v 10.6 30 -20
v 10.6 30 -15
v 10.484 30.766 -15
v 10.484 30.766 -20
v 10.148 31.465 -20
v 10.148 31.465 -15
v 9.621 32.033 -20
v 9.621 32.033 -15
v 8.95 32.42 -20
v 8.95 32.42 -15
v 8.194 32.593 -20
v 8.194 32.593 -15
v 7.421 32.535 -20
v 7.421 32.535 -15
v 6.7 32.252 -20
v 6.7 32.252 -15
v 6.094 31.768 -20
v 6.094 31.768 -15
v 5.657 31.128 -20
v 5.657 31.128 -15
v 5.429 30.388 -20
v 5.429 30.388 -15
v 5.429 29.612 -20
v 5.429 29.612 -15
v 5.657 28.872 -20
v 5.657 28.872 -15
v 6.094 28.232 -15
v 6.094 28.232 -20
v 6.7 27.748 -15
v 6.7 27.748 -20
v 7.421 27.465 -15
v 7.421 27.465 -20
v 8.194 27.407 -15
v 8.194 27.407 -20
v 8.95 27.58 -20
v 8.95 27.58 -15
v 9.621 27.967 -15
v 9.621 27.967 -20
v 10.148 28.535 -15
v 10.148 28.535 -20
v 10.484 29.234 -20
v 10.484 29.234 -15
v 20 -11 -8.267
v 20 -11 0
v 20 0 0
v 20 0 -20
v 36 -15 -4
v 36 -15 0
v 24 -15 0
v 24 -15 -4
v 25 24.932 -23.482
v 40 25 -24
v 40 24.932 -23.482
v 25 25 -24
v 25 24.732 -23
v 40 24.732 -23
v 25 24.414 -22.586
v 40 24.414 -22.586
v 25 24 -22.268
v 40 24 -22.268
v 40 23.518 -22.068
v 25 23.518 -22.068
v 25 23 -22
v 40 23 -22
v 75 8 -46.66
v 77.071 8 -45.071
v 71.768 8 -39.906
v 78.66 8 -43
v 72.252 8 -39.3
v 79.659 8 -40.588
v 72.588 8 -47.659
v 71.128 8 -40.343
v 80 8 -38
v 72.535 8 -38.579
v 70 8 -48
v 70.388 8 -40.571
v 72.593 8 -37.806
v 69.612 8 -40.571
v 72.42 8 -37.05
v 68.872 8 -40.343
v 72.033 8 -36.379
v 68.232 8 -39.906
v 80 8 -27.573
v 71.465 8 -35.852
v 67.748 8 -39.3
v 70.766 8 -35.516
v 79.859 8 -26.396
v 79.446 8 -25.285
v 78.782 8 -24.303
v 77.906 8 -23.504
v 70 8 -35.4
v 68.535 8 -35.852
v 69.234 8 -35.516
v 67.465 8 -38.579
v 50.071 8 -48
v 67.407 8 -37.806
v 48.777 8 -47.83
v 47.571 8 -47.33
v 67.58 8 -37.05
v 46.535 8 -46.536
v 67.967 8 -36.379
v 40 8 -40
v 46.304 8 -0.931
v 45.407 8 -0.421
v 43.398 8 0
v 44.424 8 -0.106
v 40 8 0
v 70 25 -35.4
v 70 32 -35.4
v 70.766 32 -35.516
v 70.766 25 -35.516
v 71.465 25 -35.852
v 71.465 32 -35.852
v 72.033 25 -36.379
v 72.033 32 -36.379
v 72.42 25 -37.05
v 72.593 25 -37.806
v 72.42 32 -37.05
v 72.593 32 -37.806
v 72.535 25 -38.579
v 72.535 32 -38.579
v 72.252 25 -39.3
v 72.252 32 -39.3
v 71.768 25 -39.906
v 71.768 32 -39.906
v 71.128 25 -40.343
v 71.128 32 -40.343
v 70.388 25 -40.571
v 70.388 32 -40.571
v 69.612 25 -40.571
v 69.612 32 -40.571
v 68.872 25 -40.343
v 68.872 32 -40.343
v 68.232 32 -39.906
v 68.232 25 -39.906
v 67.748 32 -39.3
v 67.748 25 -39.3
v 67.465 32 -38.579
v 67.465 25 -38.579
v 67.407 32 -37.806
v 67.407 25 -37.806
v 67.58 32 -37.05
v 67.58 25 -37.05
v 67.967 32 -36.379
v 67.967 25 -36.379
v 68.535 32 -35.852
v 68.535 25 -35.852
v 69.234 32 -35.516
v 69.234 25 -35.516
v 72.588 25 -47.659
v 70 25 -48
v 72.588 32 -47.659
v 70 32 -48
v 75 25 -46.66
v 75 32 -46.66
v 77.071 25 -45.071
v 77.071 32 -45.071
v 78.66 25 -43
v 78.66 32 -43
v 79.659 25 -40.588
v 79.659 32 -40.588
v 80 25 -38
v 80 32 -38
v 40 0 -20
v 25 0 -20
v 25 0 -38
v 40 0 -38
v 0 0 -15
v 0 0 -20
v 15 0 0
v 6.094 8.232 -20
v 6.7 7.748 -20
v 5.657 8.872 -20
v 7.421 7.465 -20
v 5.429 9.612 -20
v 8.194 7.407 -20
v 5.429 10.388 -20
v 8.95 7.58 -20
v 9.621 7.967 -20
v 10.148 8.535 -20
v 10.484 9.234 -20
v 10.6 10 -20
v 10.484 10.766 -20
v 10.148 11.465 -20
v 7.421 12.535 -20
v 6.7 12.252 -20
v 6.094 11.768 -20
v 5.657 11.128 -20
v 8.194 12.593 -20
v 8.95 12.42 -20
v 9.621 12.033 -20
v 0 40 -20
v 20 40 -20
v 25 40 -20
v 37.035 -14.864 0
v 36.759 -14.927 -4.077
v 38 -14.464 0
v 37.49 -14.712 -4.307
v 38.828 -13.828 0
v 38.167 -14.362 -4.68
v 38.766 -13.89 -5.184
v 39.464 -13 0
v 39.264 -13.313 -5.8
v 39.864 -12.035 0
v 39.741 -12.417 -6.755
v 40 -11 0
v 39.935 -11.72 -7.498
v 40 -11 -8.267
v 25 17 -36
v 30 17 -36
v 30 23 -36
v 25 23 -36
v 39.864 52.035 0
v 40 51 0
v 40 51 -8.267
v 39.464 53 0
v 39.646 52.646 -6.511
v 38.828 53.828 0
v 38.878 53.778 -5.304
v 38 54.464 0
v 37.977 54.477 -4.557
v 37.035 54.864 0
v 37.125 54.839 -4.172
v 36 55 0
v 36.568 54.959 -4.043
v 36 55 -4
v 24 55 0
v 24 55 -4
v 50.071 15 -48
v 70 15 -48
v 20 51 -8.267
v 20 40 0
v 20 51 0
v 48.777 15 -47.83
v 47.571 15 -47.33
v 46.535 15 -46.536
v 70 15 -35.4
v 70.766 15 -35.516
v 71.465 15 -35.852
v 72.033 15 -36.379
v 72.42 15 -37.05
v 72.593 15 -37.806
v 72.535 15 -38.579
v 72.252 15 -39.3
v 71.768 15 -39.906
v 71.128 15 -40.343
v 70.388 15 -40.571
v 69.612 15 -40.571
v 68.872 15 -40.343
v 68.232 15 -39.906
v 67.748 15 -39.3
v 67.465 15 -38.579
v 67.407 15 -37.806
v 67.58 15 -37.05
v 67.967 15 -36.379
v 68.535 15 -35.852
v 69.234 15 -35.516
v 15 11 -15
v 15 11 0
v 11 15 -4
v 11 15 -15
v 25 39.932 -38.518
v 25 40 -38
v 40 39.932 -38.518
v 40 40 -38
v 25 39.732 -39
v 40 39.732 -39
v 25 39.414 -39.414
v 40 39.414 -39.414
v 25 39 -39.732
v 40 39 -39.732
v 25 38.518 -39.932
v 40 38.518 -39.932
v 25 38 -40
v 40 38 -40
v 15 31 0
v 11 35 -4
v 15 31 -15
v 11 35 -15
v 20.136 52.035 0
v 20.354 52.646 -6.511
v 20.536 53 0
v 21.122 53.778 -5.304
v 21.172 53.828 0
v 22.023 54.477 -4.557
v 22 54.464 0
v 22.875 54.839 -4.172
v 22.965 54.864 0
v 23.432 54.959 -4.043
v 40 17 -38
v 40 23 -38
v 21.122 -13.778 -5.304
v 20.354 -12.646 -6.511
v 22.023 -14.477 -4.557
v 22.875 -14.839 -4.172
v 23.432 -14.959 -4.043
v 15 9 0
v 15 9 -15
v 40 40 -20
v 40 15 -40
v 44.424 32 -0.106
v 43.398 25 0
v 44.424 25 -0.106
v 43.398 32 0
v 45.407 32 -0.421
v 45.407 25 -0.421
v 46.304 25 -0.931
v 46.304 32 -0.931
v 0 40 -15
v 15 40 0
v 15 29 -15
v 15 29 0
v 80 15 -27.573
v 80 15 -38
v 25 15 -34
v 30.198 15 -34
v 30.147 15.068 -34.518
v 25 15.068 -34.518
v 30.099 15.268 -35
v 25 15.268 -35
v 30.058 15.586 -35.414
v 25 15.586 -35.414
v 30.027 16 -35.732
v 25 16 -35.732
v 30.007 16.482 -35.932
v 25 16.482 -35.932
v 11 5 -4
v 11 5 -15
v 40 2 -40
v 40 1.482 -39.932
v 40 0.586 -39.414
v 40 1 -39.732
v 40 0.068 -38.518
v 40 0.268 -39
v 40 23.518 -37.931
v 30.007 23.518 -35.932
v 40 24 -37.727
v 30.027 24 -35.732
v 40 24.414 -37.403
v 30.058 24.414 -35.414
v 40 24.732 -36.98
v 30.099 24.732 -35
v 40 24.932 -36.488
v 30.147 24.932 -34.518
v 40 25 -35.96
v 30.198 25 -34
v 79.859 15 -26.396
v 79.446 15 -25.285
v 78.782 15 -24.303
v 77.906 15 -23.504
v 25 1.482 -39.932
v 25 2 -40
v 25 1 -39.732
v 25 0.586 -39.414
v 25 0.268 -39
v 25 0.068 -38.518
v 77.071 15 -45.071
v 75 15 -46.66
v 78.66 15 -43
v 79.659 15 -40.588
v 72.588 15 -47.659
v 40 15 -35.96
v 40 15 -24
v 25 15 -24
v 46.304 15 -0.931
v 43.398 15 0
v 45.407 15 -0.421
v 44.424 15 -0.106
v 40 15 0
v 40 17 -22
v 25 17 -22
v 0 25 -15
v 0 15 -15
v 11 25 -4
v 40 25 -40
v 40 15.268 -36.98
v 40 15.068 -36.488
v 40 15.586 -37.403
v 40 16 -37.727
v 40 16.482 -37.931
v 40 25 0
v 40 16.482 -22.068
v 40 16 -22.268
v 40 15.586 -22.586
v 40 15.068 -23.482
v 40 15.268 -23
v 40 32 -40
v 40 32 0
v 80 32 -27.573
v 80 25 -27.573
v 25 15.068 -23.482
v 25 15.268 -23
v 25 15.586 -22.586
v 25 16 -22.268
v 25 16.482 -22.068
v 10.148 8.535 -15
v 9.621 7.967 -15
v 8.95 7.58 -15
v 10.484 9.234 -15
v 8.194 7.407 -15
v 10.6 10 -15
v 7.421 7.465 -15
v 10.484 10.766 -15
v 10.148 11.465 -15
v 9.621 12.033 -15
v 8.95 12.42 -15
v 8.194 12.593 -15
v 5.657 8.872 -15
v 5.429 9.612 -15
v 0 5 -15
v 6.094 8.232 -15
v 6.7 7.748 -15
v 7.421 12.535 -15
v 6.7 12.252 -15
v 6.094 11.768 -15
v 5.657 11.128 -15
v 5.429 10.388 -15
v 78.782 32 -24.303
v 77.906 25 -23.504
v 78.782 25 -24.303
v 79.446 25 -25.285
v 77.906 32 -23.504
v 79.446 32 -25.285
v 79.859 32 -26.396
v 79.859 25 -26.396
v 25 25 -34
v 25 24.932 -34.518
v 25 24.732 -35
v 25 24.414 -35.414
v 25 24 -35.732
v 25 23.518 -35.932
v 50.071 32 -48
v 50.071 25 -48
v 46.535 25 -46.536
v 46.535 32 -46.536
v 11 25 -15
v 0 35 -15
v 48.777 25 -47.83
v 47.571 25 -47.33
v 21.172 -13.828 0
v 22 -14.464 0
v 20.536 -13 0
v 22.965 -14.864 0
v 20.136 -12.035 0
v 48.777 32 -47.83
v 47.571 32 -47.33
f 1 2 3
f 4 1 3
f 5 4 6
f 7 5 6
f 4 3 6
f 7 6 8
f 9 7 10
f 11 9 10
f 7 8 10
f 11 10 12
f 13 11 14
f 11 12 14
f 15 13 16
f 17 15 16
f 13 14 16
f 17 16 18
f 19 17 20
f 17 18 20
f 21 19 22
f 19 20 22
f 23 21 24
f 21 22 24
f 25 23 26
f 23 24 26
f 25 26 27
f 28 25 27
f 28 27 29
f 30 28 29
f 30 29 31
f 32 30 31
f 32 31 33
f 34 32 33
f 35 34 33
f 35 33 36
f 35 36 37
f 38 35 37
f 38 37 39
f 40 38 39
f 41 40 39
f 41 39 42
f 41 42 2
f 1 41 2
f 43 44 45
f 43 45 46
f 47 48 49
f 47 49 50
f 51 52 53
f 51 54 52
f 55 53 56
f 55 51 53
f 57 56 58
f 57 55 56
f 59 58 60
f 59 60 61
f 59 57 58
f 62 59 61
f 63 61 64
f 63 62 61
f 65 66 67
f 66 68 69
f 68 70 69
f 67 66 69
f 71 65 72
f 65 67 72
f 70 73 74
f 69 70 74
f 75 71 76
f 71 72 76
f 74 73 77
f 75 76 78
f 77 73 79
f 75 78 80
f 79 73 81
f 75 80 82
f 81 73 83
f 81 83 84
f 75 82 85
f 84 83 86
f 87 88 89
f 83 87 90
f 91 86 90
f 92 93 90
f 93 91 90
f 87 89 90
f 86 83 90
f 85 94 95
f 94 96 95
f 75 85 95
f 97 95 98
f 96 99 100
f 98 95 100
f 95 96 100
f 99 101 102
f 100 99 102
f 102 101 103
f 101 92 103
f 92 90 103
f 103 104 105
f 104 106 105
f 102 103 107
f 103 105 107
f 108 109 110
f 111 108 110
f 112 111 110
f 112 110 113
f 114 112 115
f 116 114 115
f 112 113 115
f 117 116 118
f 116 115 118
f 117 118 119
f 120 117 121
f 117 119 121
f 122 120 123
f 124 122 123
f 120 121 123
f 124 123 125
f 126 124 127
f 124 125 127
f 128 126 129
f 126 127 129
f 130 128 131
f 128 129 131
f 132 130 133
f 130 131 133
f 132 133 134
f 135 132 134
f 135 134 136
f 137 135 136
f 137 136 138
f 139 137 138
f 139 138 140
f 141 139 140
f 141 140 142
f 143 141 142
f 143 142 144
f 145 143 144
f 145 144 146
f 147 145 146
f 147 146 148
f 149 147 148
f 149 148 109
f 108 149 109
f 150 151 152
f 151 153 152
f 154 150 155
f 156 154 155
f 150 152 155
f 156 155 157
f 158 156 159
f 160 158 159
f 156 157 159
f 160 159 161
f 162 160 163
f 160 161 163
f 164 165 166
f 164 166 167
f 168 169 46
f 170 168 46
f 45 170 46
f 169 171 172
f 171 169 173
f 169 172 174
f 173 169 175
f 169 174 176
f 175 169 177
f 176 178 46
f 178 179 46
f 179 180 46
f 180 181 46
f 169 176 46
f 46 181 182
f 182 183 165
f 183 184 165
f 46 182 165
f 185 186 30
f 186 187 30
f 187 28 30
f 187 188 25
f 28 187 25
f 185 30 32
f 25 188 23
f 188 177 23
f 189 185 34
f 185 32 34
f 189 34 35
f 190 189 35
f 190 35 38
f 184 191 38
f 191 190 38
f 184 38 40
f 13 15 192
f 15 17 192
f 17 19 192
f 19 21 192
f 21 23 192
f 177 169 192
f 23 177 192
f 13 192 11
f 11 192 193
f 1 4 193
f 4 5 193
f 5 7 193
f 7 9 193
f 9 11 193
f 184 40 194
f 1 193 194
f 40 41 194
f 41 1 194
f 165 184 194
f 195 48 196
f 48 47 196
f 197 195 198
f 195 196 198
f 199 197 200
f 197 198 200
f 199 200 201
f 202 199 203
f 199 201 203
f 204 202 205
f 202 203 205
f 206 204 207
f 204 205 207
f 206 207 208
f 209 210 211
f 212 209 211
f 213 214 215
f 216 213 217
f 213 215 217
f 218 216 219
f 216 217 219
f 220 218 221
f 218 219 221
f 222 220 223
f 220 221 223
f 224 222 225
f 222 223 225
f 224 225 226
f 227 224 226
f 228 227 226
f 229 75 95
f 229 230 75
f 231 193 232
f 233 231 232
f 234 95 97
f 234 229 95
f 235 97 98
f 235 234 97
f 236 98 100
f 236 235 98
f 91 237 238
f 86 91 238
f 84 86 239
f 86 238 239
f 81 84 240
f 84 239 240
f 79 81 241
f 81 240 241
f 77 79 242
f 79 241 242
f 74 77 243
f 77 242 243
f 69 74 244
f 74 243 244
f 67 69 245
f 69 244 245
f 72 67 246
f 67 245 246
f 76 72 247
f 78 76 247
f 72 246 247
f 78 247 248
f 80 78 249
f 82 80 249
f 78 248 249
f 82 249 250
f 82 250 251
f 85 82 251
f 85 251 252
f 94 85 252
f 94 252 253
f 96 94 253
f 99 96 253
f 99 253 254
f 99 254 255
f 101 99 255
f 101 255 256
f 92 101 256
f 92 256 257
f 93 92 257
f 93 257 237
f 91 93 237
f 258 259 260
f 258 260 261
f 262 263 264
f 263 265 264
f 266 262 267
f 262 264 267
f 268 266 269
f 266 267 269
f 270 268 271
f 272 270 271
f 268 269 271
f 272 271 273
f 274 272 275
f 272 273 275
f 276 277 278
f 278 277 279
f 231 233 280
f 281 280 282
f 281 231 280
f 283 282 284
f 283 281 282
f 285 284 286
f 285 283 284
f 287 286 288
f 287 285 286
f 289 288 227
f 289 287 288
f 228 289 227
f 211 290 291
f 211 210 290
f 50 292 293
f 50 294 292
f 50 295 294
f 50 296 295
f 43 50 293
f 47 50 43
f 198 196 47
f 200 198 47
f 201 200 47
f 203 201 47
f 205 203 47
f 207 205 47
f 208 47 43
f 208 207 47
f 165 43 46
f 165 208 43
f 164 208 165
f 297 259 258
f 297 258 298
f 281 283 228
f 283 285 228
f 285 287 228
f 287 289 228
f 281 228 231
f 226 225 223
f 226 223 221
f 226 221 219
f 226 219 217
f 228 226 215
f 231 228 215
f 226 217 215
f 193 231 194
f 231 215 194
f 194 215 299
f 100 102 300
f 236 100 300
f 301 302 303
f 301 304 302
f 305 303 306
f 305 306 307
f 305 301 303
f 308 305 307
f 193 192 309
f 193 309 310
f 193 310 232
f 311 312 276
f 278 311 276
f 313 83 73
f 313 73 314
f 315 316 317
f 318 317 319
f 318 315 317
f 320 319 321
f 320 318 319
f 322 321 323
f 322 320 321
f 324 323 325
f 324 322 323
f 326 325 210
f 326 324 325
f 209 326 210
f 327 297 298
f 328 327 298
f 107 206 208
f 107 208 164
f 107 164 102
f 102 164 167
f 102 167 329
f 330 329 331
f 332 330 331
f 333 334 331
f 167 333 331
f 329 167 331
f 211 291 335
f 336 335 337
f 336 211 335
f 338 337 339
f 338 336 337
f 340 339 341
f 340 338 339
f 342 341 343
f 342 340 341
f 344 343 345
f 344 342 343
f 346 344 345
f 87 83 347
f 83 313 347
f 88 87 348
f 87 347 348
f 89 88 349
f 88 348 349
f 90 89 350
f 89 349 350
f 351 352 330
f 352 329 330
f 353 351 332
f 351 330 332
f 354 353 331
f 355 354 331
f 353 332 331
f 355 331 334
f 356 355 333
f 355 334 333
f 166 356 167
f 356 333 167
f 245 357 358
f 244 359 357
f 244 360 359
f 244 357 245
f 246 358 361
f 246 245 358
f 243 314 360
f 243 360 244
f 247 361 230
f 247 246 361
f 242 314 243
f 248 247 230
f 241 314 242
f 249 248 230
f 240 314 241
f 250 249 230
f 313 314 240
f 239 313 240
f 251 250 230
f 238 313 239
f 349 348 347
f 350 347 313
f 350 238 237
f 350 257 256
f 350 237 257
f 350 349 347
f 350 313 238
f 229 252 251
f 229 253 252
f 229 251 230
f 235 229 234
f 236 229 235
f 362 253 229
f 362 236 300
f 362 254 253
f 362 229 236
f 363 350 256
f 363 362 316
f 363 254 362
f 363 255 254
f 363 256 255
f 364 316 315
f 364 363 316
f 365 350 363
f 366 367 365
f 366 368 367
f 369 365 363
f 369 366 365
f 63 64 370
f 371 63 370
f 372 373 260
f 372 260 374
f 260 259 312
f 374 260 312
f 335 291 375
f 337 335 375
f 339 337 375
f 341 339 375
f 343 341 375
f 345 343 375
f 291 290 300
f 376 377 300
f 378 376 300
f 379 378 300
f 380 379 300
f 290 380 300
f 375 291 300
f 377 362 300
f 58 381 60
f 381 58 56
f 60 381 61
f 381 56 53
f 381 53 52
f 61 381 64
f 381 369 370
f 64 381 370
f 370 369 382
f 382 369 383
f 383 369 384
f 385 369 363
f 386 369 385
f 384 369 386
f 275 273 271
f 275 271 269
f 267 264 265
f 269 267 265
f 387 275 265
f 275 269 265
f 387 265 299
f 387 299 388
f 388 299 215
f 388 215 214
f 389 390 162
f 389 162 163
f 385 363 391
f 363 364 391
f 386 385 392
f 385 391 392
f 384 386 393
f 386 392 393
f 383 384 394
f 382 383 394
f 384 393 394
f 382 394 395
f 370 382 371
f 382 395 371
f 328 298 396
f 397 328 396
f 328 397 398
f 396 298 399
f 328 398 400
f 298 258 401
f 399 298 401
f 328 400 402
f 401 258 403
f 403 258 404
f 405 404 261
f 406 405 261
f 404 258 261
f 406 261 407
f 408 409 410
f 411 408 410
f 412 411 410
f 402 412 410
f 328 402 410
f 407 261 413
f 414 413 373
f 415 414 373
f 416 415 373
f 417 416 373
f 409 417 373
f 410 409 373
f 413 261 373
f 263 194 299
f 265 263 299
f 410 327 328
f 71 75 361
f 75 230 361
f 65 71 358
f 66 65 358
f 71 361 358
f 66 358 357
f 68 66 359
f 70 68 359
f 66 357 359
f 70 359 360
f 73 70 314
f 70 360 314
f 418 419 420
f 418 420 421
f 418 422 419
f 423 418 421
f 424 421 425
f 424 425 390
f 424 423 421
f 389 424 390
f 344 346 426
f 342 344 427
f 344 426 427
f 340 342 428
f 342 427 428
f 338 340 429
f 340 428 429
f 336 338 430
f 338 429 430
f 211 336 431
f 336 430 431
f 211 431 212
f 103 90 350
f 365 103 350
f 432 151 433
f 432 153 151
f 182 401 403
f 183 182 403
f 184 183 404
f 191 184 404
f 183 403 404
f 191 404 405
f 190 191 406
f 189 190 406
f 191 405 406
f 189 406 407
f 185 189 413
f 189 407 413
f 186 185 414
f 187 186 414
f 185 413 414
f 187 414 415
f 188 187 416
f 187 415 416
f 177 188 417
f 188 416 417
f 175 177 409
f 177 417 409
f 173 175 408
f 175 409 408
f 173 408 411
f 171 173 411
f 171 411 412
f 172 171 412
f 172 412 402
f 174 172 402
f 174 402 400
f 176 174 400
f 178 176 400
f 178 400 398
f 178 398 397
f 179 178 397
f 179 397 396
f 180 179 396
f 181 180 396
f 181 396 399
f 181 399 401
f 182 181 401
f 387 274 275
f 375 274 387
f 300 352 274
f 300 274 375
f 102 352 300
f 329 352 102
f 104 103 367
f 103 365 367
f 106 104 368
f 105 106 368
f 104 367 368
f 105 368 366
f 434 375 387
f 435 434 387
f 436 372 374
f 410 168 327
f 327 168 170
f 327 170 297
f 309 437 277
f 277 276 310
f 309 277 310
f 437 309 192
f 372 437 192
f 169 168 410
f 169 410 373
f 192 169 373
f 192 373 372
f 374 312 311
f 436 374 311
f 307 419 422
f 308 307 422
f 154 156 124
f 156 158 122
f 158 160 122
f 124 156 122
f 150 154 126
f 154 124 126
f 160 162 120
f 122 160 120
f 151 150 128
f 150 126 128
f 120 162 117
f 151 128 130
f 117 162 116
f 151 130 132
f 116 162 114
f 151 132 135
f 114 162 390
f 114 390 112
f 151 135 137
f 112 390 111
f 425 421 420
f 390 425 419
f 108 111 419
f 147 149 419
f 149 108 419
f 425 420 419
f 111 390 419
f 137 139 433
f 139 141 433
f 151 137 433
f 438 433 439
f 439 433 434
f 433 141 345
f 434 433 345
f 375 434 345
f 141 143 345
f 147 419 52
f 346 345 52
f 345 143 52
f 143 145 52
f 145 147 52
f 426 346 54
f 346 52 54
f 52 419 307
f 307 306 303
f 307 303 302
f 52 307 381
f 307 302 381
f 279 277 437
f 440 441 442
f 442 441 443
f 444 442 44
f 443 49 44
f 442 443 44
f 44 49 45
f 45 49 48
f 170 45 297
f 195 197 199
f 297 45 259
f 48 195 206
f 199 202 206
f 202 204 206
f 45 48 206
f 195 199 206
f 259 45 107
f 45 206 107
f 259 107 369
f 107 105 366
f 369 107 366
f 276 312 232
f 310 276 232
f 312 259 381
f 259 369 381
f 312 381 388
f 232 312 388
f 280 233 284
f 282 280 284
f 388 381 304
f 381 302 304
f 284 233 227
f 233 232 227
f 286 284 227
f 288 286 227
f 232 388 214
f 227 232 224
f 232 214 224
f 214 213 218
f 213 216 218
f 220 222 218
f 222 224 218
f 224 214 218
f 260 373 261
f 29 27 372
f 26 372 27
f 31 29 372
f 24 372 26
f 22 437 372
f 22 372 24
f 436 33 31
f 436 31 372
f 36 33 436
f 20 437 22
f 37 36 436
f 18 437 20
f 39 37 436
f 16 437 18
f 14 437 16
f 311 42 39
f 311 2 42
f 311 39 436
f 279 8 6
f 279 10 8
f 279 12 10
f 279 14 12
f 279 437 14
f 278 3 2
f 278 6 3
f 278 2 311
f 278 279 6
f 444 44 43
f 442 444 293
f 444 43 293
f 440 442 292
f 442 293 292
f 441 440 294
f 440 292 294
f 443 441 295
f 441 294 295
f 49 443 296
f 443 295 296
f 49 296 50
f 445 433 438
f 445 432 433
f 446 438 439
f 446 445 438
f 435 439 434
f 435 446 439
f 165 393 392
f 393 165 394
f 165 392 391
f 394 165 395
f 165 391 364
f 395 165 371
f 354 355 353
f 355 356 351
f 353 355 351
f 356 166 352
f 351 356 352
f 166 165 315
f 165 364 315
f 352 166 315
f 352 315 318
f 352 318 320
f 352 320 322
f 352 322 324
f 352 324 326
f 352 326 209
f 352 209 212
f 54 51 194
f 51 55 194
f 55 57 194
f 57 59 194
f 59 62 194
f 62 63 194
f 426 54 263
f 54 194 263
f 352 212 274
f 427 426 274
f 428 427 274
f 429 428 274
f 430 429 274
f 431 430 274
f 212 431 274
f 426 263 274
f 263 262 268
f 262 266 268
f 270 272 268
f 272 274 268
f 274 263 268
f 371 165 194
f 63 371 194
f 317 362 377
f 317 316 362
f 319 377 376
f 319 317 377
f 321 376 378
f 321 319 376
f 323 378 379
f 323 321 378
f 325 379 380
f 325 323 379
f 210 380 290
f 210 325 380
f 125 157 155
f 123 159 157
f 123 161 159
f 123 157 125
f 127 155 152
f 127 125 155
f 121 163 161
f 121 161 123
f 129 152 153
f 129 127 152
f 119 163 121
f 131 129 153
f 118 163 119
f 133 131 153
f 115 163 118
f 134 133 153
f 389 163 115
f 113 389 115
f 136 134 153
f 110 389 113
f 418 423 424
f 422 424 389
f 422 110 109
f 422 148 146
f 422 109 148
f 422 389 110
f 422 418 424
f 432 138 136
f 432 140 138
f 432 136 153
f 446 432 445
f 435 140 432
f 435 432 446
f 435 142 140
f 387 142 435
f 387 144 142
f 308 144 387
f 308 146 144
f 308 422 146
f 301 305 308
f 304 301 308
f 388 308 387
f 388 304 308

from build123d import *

# Parameters (mm, degrees)
SKETCH1_W                = 40
SKETCH1_H                = 40
BOSS_EXTRUDE1_DEPTH      = 40
SKETCH2_W                = 25
SKETCH2_H                = 20
CUT_EXTRUDE1_DEPTH       = 40
CHAMFER1_SIZE            = 15
CUT_EXTRUDE2_DEPTH       = 15
CHAMFER2_SIZE            = 4
SKETCH4_R                = 2.6
CUT_EXTRUDE3_DEPTH       = 17
BOSS_EXTRUDE2_DEPTH      = 8
BOSS_EXTRUDE2_DEPTH_BACK = 40
SKETCH5_W                = 40
SKETCH5_H                = 7
CHAMFER3_SIZE            = 35
CHAMFER3_SIZE2           = 25
CHAMFER4_SIZE            = 25
CHAMFER4_SIZE2           = 35
CHAMFER5_SIZE            = 8
FILLET1_R                = 10
FILLET2_R                = 5
SKETCH8_R                = 2.6
CUT_EXTRUDE4_DEPTH       = 34
BOSS_EXTRUDE3_DEPTH      = 20
FILLET3_R                = 4
FILLET4_R                = 2
CUT_EXTRUDE5_DEPTH       = 26
CHAMFER6_SIZE            = 2
CHAMFER6_SIZE2           = 10
FILLET5_R                = 2


with BuildPart() as part:
    # Sketch1 → Boss-Extrude1 (new body)
    with BuildSketch(Plane(origin=(0, 0, 0), x_dir=(1, 0, 0), z_dir=(0, 1, 0))):
        with Locations((20, 20)):
            Rectangle(SKETCH1_W, SKETCH1_H)
    extrude(amount=BOSS_EXTRUDE1_DEPTH)

    # Sketch2 → Cut-Extrude1 (cut)
    with BuildSketch(Plane(origin=(0, 40, 0), x_dir=(1, 0, 0), z_dir=(0, 1, 0))):
        with Locations((12.5, 30)):
            Rectangle(SKETCH2_W, SKETCH2_H)
    extrude(amount=-CUT_EXTRUDE1_DEPTH, mode=Mode.SUBTRACT)

    # Chamfer1
    chamfer1_edges = [part.edges().sort_by_distance(p)[0] for p in [
        (0, 20, 0),
    ]]
    chamfer(chamfer1_edges, length=CHAMFER1_SIZE)

    # Sketch3 → Cut-Extrude2 (cut)
    with BuildSketch(Plane.XY):
        Polygon((0, 10), (0, 15), (15, 15), (15, 5), (0, 5), align=None)
        Polygon((0, 30), (0, 25), (15, 25), (15, 35), (0, 35), align=None)
    extrude(amount=-CUT_EXTRUDE2_DEPTH, mode=Mode.SUBTRACT)

    # Chamfer2
    chamfer2_edges = [part.edges().sort_by_distance(p)[0] for p in [
        (15, 35, -7.5),
        (15, 25, -7.5),
        (15, 15, -7.5),
        (15, 5, -7.5),
    ]]
    chamfer(chamfer2_edges, length=CHAMFER2_SIZE)

    # Sketch4 → Cut-Extrude3 (cut)
    with BuildSketch(Plane.XY.offset(-15)):
        with Locations((8, 30)):
            Circle(SKETCH4_R)
        with Locations((8, 10)):
            Circle(SKETCH4_R)
    extrude(amount=-CUT_EXTRUDE3_DEPTH, mode=Mode.SUBTRACT)

    # Sketch5 → Boss-Extrude2 (add, two sides: drawn at the far end of the back side and taken through both)
    with BuildSketch(Plane(origin=(0, 0, -40), x_dir=(-1, 0, 0), z_dir=(0, 0, -1)).offset(-BOSS_EXTRUDE2_DEPTH_BACK)):
        with Locations((-60, 11.5)):
            Rectangle(SKETCH5_W, SKETCH5_H)
        with Locations((-60, 28.5)):
            Rectangle(SKETCH5_W, SKETCH5_H)
    extrude(amount=BOSS_EXTRUDE2_DEPTH + BOSS_EXTRUDE2_DEPTH_BACK)

    # Chamfer3
    chamfer3_edges = [part.edges().sort_by_distance(p)[0] for p in [
        (80, 28.5, 0),
    ]]
    chamfer3_side = [part.faces().sort_by_distance(p)[0] for p in [
        (39.166666667, 20, 0),
    ]]
    chamfer(chamfer3_edges, length=CHAMFER3_SIZE, length2=CHAMFER3_SIZE2, reference=chamfer3_side[0])

    # Chamfer4
    chamfer4_edges = [part.edges().sort_by_distance(p)[0] for p in [
        (80, 11.5, 0),
    ]]
    chamfer4_side = [part.faces().sort_by_distance(p)[0] for p in [
        (80, 11.5, -24),
    ]]
    chamfer(chamfer4_edges, length=CHAMFER4_SIZE, length2=CHAMFER4_SIZE2, reference=chamfer4_side[0])

    # Chamfer5
    chamfer5_edges = [part.edges().sort_by_distance(p)[0] for p in [
        (40, 28.5, -48),
        (40, 11.5, -48),
    ]]
    chamfer(chamfer5_edges, length=CHAMFER5_SIZE - 0.0001)  # a hair under: the kernel refuses the full size

    # Fillet1
    fillet1_edges = [part.edges().sort_by_distance(p)[0] for p in [
        (80, 11.5, -48),
        (80, 28.5, -48),
    ]]
    fillet(fillet1_edges, radius=FILLET1_R)

    # Fillet2
    fillet2_edges = [part.edges().sort_by_distance(p)[0] for p in [
        (80, 28.5, -25),
        (45, 28.5, 0),
        (45, 11.5, 0),
        (80, 11.5, -25),
        (47.9999, 28.5, -48),
        (47.9999, 11.5, -48),
    ]]
    fillet(fillet2_edges, radius=FILLET2_R)

    # Sketch8 → Cut-Extrude4 (cut)
    with BuildSketch(Plane(origin=(0, 32, 0), x_dir=(1, 0, 0), z_dir=(0, 1, 0))):
        with Locations(Location((70, 38, 0), (0, 0, 270))):
            Circle(SKETCH8_R)
    extrude(amount=-CUT_EXTRUDE4_DEPTH, mode=Mode.SUBTRACT)

    # Sketch9 → Boss-Extrude3 (add)
    with BuildSketch(Plane(origin=(40, 0, 0), x_dir=(0, 0, -1), z_dir=(1, 0, 0))):
        Polygon((0, 40), (0, 55), (4, 55), (20, 40), align=None)
        Polygon((0, 0), (0, -15), (4, -15), (20, 0), align=None)
    extrude(amount=-BOSS_EXTRUDE3_DEPTH)

    # Fillet3
    fillet3_edges = [part.edges().sort_by_distance(p)[0] for p in [
        (20, 55, -2),
        (40, 55, -2),
        (20, -15, -2),
        (40, -15, -2),
    ]]
    fillet(fillet3_edges, radius=FILLET3_R)

    # Fillet4
    fillet4_edges = [part.edges().sort_by_distance(p)[0] for p in [
        (32.5, 40, -40),
        (32.5, 0, -40),
    ]]
    fillet(fillet4_edges, radius=FILLET4_R)

    # Sketch10 → Cut-Extrude5 (cut)
    with BuildSketch(Plane(origin=(40, 0, 0), x_dir=(0, 0, -1), z_dir=(1, 0, 0))):
        Polygon((22, 15), (36, 15), (36, 20), (36, 25), (22, 25), align=None)
    extrude(amount=-CUT_EXTRUDE5_DEPTH, mode=Mode.SUBTRACT)

    # Chamfer6
    chamfer6_edges = [part.edges().sort_by_distance(p)[0] for p in [
        (40, 20, -36),
    ]]
    chamfer6_side = [part.faces().sort_by_distance(p)[0] for p in [
        (40, 20, -38),
    ]]
    chamfer(chamfer6_edges, length=CHAMFER6_SIZE, length2=CHAMFER6_SIZE2, reference=chamfer6_side[0])

    # Fillet5
    fillet5_edges = [part.edges().sort_by_distance(p)[0] for p in [
        (32.5, 25, -22),
        (27.5, 25, -36),
        (27.5, 15, -36),
        (32.5, 15, -22),
        (35, 25, -37),
        (35, 15, -37),
    ]]
    fillet(fillet5_edges, radius=FILLET5_R)


solid = part.part
